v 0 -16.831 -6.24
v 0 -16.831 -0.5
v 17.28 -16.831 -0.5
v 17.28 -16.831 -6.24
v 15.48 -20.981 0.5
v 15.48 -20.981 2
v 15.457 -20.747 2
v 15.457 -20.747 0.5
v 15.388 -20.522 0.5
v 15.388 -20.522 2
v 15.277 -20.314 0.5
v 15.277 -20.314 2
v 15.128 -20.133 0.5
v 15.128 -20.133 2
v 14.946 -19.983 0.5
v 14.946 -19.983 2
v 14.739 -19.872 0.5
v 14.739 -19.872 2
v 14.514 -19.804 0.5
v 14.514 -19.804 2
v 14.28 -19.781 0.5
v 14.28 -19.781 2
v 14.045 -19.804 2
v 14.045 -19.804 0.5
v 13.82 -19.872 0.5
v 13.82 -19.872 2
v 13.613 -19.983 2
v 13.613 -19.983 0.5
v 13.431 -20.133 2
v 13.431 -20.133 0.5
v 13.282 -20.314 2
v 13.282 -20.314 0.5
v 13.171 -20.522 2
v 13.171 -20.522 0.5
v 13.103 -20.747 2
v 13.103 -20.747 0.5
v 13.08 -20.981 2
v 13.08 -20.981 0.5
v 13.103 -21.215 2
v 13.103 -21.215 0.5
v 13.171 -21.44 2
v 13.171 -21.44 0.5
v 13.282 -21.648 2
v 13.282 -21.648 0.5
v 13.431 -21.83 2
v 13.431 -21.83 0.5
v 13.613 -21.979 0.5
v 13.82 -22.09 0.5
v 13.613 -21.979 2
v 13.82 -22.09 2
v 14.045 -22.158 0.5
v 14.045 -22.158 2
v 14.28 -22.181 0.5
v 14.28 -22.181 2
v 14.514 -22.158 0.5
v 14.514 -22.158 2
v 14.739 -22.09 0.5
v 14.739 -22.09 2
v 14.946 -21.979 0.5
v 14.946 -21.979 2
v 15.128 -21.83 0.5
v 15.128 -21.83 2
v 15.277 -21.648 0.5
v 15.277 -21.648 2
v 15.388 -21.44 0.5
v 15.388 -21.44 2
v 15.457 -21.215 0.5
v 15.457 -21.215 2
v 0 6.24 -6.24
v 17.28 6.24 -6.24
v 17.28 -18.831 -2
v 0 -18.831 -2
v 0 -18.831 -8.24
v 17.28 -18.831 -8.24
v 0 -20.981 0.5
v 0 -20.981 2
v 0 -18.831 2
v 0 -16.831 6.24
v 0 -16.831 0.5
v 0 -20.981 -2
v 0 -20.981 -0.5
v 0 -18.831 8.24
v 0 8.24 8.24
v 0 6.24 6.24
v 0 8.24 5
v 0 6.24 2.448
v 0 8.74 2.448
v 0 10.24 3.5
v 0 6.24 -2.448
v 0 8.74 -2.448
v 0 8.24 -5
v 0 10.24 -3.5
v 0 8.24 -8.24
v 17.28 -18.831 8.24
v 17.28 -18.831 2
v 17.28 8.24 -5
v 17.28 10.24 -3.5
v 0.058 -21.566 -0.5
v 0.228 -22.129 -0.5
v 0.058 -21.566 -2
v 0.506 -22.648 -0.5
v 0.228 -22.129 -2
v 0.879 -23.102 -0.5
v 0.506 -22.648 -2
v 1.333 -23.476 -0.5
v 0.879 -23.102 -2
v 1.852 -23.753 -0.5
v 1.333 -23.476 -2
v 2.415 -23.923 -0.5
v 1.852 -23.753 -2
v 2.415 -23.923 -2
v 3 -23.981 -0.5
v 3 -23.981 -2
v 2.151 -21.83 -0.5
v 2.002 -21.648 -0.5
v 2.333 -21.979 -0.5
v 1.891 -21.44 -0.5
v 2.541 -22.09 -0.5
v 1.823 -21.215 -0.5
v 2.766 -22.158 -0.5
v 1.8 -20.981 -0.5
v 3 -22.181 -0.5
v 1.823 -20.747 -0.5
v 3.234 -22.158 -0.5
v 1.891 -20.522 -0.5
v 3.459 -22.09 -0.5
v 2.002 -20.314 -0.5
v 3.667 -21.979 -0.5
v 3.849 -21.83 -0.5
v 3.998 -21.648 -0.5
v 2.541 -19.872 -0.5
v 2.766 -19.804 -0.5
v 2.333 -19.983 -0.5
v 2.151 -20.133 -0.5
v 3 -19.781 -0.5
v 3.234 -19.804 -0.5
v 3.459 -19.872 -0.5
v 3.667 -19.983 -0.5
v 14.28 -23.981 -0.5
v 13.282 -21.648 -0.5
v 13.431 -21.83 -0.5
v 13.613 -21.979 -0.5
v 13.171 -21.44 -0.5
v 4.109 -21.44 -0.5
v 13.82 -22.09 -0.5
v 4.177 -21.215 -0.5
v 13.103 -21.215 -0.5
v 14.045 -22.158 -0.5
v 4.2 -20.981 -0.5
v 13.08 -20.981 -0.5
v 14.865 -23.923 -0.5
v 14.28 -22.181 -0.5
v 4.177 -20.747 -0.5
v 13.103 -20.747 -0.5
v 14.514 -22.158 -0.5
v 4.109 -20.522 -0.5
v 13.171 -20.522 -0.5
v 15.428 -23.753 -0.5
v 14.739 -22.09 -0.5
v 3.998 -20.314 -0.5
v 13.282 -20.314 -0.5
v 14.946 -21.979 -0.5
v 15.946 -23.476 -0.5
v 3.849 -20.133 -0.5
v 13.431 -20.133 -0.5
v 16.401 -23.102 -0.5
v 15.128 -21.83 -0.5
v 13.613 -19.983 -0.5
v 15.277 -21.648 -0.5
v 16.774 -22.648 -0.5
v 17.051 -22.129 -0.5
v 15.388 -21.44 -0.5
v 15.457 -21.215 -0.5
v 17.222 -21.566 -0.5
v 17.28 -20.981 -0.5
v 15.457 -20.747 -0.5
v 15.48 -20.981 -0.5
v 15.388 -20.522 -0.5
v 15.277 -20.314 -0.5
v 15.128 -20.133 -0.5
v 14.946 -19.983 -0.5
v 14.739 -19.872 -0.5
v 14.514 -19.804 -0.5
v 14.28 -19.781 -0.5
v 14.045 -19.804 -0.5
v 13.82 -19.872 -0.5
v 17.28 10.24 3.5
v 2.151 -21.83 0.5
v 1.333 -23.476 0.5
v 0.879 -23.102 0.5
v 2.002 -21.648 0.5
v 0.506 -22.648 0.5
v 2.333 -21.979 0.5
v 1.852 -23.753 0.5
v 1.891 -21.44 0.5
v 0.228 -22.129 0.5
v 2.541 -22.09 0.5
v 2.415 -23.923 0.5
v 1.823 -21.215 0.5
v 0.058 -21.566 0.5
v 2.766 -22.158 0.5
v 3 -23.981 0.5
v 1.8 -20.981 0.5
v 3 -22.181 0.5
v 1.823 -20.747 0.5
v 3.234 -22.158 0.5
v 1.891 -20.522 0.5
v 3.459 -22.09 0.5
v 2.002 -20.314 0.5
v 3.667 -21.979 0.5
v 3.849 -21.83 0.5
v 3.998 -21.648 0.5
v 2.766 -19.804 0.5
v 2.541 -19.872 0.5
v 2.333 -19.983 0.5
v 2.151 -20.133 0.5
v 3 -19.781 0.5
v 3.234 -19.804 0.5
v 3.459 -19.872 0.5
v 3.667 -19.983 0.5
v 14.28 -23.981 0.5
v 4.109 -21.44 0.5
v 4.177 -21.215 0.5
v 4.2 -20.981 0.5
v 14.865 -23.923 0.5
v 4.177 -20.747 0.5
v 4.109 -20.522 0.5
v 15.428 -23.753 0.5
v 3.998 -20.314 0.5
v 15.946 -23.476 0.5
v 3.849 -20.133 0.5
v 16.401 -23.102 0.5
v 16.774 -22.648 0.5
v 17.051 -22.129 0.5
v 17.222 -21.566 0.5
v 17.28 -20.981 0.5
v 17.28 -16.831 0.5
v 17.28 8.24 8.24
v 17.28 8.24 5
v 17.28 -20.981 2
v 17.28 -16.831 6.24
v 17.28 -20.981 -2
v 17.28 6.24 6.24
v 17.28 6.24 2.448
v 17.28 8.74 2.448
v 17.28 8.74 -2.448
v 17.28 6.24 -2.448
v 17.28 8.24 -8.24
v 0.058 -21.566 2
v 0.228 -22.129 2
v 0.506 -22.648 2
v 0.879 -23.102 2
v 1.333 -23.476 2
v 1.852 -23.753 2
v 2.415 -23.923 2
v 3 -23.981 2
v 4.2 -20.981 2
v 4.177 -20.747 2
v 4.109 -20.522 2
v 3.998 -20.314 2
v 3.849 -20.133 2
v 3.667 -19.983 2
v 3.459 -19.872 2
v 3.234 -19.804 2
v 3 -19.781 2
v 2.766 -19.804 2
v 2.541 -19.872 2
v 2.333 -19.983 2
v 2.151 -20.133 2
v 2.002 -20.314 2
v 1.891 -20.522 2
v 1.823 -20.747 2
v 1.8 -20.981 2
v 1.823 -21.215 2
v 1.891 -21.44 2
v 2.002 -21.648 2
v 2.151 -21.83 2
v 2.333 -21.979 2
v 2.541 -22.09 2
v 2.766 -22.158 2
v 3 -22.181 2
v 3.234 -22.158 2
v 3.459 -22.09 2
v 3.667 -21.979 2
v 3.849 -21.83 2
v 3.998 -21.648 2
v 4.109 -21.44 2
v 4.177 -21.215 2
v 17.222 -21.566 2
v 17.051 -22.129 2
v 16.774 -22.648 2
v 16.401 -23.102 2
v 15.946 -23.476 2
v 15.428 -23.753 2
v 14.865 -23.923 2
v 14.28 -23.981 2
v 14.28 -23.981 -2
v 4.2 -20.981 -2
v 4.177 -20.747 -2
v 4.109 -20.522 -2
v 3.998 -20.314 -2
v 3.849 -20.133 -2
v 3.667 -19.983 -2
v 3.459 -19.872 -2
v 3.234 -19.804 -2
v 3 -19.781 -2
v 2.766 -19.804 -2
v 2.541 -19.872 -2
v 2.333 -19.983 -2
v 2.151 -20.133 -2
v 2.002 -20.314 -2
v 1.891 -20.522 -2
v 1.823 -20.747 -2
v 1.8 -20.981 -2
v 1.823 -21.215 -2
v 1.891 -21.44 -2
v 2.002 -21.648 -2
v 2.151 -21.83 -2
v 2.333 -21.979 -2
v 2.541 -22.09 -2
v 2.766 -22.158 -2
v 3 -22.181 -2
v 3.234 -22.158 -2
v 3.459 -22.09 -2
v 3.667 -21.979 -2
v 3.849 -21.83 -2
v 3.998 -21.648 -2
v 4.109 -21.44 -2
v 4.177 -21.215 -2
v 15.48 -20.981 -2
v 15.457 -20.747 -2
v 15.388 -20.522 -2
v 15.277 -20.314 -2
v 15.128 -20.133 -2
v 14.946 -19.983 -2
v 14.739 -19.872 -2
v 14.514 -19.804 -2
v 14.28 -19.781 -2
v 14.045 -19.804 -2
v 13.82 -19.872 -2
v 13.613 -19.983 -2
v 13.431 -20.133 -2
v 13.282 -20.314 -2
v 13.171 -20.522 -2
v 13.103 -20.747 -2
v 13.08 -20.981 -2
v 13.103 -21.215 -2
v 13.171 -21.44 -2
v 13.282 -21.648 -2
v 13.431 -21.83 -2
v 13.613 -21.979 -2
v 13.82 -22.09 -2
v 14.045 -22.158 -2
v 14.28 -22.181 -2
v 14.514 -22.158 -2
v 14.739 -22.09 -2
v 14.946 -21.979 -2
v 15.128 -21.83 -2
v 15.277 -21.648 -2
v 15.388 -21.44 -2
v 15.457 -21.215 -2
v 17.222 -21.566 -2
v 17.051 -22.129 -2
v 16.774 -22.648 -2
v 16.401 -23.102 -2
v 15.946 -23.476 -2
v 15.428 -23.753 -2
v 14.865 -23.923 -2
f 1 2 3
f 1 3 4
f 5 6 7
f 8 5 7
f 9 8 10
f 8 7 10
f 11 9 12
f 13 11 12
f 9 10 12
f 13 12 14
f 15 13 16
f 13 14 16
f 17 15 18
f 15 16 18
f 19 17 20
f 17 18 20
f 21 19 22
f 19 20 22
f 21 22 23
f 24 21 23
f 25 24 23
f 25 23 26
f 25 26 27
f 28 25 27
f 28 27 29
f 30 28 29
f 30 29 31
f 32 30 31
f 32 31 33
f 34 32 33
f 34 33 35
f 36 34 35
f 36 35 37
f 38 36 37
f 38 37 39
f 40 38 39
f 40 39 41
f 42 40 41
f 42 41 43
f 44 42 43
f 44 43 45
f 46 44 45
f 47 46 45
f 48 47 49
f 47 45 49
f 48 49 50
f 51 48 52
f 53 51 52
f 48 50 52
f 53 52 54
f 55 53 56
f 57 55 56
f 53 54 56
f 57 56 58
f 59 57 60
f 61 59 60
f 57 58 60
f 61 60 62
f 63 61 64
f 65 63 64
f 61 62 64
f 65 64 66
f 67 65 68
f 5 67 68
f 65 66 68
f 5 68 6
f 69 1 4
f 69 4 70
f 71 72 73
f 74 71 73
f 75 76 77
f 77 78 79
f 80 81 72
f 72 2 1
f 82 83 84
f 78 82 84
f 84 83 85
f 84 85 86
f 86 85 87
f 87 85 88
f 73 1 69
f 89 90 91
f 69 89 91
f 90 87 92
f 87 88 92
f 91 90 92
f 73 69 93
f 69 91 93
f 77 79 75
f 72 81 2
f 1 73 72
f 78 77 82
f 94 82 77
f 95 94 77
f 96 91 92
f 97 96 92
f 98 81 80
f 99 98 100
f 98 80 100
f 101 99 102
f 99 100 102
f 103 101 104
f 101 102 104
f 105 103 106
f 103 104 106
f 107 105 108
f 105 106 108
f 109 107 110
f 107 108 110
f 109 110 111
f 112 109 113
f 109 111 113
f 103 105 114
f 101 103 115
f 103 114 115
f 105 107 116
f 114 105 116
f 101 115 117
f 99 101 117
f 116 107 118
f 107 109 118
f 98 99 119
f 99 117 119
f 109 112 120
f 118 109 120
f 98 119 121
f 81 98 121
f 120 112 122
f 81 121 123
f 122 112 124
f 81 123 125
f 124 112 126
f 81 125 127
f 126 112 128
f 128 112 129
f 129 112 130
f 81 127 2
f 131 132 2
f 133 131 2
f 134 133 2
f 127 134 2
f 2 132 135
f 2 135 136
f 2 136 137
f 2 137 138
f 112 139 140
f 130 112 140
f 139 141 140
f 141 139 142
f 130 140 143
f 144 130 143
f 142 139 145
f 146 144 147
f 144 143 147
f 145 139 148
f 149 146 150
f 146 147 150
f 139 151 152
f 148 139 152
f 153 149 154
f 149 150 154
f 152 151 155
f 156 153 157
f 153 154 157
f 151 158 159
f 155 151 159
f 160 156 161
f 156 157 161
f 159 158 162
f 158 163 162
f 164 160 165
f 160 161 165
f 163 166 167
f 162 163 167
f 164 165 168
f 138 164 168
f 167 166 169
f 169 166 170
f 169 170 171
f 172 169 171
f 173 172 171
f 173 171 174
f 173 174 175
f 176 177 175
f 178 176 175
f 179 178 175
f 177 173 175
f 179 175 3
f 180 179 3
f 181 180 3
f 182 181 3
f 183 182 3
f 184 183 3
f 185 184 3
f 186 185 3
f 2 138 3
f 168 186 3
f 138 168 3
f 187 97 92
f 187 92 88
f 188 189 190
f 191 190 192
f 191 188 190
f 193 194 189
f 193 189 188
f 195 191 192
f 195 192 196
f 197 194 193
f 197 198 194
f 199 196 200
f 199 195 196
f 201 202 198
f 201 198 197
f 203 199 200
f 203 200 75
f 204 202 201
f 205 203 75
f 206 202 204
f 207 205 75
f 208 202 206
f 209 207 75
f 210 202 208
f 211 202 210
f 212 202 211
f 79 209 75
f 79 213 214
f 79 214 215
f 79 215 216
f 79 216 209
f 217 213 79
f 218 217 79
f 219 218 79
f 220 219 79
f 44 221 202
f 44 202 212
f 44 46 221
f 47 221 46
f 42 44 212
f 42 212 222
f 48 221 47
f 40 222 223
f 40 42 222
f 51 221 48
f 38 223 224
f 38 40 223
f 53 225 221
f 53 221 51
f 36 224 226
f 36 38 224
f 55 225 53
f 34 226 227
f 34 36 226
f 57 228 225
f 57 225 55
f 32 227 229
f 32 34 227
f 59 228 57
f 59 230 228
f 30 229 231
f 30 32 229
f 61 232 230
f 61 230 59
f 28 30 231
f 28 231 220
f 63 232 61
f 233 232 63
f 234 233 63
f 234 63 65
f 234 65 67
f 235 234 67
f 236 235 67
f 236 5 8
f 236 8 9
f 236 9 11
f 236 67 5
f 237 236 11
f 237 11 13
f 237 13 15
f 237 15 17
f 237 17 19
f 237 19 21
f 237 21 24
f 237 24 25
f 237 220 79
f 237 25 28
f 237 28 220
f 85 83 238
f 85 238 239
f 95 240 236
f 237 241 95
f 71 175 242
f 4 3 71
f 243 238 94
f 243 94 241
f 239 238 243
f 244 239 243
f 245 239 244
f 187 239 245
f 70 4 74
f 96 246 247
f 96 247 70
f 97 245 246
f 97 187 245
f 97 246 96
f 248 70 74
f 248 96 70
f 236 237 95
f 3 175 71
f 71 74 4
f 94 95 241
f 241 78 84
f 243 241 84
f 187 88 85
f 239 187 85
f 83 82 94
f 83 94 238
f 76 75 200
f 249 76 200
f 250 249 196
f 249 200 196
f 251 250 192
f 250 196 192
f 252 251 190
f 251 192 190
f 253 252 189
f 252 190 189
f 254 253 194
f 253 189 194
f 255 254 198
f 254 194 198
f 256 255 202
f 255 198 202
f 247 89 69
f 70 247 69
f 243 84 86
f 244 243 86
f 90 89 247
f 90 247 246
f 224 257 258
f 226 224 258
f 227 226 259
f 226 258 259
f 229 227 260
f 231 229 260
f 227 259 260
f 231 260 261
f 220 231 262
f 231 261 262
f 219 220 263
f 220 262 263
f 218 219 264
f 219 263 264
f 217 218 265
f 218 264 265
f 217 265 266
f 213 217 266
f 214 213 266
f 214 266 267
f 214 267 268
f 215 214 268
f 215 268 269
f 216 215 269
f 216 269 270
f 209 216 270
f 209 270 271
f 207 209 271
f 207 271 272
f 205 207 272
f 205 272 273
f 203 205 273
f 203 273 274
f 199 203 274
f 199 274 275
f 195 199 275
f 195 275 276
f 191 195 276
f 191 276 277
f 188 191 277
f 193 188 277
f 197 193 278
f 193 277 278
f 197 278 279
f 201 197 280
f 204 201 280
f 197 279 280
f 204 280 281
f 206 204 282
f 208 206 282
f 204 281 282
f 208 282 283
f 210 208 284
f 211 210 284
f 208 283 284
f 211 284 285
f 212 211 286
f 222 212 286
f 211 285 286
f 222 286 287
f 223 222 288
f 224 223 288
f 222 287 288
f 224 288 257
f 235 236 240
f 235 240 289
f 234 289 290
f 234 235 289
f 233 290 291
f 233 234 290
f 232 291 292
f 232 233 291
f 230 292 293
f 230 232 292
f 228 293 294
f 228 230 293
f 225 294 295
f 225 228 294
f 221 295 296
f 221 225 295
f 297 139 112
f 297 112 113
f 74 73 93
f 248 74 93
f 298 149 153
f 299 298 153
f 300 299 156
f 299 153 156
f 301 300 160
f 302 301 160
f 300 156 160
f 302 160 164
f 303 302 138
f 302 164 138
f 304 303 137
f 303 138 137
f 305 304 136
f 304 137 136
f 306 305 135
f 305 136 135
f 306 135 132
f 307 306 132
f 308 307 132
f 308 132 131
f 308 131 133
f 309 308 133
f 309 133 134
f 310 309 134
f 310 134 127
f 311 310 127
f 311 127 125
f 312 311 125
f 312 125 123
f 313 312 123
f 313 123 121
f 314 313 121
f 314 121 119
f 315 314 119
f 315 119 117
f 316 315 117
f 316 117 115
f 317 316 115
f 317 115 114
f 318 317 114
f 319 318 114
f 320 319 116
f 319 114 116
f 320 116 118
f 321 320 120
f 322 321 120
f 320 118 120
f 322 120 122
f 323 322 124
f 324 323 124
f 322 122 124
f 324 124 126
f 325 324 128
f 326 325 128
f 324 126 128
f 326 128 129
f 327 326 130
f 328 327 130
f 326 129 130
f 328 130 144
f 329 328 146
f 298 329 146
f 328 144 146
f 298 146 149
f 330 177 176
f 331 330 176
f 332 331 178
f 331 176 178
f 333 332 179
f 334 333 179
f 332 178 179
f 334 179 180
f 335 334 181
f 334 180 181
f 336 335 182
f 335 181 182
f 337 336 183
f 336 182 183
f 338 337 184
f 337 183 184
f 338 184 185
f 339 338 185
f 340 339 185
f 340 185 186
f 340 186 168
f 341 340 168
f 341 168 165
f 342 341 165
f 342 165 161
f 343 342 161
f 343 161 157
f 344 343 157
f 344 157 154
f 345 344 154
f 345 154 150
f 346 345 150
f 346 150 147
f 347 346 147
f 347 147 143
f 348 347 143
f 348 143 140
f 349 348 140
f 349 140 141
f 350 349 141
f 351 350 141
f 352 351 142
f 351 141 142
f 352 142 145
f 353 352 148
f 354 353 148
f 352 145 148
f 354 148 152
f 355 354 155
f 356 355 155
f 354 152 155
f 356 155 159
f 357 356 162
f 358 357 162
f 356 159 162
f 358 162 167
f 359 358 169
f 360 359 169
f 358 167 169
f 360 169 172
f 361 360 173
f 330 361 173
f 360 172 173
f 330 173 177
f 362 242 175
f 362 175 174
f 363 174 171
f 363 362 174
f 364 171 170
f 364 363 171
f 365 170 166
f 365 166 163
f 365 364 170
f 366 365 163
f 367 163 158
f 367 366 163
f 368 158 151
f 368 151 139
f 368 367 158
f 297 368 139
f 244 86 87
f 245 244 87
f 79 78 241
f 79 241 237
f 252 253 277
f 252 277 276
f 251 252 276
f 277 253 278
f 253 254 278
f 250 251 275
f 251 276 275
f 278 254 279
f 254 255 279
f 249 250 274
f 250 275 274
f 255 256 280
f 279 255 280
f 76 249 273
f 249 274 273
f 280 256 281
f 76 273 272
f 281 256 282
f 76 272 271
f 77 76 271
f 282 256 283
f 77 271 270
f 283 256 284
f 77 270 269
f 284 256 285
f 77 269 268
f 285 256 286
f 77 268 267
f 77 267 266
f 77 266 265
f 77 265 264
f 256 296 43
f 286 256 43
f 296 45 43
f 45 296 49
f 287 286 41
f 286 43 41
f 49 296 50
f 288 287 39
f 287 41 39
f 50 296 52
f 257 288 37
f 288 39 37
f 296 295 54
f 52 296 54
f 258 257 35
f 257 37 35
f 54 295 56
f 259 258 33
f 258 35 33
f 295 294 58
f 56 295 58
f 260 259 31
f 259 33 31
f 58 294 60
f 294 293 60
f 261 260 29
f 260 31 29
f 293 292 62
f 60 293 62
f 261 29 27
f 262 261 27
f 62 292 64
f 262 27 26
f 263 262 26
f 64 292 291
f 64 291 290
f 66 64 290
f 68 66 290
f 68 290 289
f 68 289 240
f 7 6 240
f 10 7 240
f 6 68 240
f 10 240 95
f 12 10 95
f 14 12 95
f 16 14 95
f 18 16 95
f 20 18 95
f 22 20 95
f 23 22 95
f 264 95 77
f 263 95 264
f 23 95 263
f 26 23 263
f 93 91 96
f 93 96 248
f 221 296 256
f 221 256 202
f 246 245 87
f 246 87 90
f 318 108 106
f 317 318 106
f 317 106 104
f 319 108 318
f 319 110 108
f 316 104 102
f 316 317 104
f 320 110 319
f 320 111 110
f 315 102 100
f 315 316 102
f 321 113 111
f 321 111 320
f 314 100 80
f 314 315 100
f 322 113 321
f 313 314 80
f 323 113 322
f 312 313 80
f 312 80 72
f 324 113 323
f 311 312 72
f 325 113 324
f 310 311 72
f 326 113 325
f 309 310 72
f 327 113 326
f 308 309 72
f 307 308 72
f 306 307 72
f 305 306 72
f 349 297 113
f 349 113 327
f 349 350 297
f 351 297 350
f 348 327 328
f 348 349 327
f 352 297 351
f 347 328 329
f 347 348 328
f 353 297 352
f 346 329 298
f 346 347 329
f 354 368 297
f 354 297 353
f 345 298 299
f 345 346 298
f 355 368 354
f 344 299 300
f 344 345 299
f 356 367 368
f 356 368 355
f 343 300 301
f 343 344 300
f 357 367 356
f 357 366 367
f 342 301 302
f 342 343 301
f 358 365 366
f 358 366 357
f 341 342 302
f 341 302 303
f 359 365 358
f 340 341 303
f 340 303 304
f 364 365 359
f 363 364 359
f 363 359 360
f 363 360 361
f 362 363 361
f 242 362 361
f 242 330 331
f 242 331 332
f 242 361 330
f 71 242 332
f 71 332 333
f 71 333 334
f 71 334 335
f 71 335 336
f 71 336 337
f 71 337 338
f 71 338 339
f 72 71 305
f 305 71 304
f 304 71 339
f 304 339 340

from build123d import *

# Parameters (mm, degrees)
SKETCH1_W            = 16.48
SKETCH1_H            = 27.0711
SKETCH1_W_2          = 12.48
SKETCH1_H_2          = 23.0711
BOSS_EXTRUDE1_DEPTH  = 17.2796
BOSS_EXTRUDE2_DEPTH  = 17.2796
SKETCH3_W            = 4.8956
SKETCH3_H            = 3.65
CUT_EXTRUDE1_DEPTH   = 27.853165612
SKETCH4_W            = 4
SKETCH4_H            = 5.15
BOSS_EXTRUDE3_DEPTH  = 17.2796
FILLET1_R            = 3
SKETCH5_W            = 1
SKETCH5_H            = 7.15
CUT_EXTRUDE3_DEPTH   = 31.685099533
M2_CLEARANCE_HOLE1_D = 2.4


with BuildPart() as part:
    # Sketch1 → Boss-Extrude1 (new body)
    with BuildSketch(Plane(origin=(0, 0, 0), x_dir=(0, 0, -1), z_dir=(1, 0, 0))):
        with Locations((0, -5.29555)):
            Rectangle(SKETCH1_W, SKETCH1_H)
        with Locations((0, -5.29555)):
            Rectangle(SKETCH1_W_2, SKETCH1_H_2, mode=Mode.SUBTRACT)
    extrude(amount=BOSS_EXTRUDE1_DEPTH)

    # Sketch2 → Boss-Extrude2 (add)
    with BuildSketch(Plane(origin=(17.2796, 0, 0), x_dir=(0, 0, -1), z_dir=(1, 0, 0))):
        Polygon((-5, 8.24), (5, 8.24), (3.5, 10.24), (-3.5, 10.24), align=None)
    extrude(amount=-BOSS_EXTRUDE2_DEPTH)

    # Sketch3 → Cut-Extrude1 (cut, through all)
    with BuildSketch(Plane(origin=(17.2796, 0, 0), x_dir=(0, 0, -1), z_dir=(1, 0, 0))):
        with Locations((0, 6.915)):
            Rectangle(SKETCH3_W, SKETCH3_H)
    extrude(amount=-CUT_EXTRUDE1_DEPTH, mode=Mode.SUBTRACT)

    # Sketch4 → Boss-Extrude3 (add)
    with BuildSketch(Plane(origin=(17.2796, 0, 0), x_dir=(0, 0, -1), z_dir=(1, 0, 0))):
        with Locations((0, -21.4061)):
            Rectangle(SKETCH4_W, SKETCH4_H)
    extrude(amount=-BOSS_EXTRUDE3_DEPTH)

    # Fillet1
    fillet1_edges = [part.edges().sort_by_distance(p)[0] for p in [
        (17.2796, -23.9811, 0),
        (0, -23.9811, 0),
    ]]
    fillet(fillet1_edges, radius=FILLET1_R)

    # Sketch5 → Cut-Extrude3 (cut, through all)
    with BuildSketch(Plane(origin=(17.2796, 0, 0), x_dir=(0, 0, -1), z_dir=(1, 0, 0))):
        with Locations((0, -20.4061)):
            Rectangle(SKETCH5_W, SKETCH5_H)
    extrude(amount=-CUT_EXTRUDE3_DEPTH, mode=Mode.SUBTRACT)

    # M2 Clearance Hole1 (through all)
    with Locations(Plane(origin=(0, 0, -2), x_dir=(-1, 0, 0), z_dir=(0, 0, -1))):
        with Locations((-14.2796, -20.9811), (-3, -20.9811)):
            Hole(M2_CLEARANCE_HOLE1_D / 2)


solid = part.part
